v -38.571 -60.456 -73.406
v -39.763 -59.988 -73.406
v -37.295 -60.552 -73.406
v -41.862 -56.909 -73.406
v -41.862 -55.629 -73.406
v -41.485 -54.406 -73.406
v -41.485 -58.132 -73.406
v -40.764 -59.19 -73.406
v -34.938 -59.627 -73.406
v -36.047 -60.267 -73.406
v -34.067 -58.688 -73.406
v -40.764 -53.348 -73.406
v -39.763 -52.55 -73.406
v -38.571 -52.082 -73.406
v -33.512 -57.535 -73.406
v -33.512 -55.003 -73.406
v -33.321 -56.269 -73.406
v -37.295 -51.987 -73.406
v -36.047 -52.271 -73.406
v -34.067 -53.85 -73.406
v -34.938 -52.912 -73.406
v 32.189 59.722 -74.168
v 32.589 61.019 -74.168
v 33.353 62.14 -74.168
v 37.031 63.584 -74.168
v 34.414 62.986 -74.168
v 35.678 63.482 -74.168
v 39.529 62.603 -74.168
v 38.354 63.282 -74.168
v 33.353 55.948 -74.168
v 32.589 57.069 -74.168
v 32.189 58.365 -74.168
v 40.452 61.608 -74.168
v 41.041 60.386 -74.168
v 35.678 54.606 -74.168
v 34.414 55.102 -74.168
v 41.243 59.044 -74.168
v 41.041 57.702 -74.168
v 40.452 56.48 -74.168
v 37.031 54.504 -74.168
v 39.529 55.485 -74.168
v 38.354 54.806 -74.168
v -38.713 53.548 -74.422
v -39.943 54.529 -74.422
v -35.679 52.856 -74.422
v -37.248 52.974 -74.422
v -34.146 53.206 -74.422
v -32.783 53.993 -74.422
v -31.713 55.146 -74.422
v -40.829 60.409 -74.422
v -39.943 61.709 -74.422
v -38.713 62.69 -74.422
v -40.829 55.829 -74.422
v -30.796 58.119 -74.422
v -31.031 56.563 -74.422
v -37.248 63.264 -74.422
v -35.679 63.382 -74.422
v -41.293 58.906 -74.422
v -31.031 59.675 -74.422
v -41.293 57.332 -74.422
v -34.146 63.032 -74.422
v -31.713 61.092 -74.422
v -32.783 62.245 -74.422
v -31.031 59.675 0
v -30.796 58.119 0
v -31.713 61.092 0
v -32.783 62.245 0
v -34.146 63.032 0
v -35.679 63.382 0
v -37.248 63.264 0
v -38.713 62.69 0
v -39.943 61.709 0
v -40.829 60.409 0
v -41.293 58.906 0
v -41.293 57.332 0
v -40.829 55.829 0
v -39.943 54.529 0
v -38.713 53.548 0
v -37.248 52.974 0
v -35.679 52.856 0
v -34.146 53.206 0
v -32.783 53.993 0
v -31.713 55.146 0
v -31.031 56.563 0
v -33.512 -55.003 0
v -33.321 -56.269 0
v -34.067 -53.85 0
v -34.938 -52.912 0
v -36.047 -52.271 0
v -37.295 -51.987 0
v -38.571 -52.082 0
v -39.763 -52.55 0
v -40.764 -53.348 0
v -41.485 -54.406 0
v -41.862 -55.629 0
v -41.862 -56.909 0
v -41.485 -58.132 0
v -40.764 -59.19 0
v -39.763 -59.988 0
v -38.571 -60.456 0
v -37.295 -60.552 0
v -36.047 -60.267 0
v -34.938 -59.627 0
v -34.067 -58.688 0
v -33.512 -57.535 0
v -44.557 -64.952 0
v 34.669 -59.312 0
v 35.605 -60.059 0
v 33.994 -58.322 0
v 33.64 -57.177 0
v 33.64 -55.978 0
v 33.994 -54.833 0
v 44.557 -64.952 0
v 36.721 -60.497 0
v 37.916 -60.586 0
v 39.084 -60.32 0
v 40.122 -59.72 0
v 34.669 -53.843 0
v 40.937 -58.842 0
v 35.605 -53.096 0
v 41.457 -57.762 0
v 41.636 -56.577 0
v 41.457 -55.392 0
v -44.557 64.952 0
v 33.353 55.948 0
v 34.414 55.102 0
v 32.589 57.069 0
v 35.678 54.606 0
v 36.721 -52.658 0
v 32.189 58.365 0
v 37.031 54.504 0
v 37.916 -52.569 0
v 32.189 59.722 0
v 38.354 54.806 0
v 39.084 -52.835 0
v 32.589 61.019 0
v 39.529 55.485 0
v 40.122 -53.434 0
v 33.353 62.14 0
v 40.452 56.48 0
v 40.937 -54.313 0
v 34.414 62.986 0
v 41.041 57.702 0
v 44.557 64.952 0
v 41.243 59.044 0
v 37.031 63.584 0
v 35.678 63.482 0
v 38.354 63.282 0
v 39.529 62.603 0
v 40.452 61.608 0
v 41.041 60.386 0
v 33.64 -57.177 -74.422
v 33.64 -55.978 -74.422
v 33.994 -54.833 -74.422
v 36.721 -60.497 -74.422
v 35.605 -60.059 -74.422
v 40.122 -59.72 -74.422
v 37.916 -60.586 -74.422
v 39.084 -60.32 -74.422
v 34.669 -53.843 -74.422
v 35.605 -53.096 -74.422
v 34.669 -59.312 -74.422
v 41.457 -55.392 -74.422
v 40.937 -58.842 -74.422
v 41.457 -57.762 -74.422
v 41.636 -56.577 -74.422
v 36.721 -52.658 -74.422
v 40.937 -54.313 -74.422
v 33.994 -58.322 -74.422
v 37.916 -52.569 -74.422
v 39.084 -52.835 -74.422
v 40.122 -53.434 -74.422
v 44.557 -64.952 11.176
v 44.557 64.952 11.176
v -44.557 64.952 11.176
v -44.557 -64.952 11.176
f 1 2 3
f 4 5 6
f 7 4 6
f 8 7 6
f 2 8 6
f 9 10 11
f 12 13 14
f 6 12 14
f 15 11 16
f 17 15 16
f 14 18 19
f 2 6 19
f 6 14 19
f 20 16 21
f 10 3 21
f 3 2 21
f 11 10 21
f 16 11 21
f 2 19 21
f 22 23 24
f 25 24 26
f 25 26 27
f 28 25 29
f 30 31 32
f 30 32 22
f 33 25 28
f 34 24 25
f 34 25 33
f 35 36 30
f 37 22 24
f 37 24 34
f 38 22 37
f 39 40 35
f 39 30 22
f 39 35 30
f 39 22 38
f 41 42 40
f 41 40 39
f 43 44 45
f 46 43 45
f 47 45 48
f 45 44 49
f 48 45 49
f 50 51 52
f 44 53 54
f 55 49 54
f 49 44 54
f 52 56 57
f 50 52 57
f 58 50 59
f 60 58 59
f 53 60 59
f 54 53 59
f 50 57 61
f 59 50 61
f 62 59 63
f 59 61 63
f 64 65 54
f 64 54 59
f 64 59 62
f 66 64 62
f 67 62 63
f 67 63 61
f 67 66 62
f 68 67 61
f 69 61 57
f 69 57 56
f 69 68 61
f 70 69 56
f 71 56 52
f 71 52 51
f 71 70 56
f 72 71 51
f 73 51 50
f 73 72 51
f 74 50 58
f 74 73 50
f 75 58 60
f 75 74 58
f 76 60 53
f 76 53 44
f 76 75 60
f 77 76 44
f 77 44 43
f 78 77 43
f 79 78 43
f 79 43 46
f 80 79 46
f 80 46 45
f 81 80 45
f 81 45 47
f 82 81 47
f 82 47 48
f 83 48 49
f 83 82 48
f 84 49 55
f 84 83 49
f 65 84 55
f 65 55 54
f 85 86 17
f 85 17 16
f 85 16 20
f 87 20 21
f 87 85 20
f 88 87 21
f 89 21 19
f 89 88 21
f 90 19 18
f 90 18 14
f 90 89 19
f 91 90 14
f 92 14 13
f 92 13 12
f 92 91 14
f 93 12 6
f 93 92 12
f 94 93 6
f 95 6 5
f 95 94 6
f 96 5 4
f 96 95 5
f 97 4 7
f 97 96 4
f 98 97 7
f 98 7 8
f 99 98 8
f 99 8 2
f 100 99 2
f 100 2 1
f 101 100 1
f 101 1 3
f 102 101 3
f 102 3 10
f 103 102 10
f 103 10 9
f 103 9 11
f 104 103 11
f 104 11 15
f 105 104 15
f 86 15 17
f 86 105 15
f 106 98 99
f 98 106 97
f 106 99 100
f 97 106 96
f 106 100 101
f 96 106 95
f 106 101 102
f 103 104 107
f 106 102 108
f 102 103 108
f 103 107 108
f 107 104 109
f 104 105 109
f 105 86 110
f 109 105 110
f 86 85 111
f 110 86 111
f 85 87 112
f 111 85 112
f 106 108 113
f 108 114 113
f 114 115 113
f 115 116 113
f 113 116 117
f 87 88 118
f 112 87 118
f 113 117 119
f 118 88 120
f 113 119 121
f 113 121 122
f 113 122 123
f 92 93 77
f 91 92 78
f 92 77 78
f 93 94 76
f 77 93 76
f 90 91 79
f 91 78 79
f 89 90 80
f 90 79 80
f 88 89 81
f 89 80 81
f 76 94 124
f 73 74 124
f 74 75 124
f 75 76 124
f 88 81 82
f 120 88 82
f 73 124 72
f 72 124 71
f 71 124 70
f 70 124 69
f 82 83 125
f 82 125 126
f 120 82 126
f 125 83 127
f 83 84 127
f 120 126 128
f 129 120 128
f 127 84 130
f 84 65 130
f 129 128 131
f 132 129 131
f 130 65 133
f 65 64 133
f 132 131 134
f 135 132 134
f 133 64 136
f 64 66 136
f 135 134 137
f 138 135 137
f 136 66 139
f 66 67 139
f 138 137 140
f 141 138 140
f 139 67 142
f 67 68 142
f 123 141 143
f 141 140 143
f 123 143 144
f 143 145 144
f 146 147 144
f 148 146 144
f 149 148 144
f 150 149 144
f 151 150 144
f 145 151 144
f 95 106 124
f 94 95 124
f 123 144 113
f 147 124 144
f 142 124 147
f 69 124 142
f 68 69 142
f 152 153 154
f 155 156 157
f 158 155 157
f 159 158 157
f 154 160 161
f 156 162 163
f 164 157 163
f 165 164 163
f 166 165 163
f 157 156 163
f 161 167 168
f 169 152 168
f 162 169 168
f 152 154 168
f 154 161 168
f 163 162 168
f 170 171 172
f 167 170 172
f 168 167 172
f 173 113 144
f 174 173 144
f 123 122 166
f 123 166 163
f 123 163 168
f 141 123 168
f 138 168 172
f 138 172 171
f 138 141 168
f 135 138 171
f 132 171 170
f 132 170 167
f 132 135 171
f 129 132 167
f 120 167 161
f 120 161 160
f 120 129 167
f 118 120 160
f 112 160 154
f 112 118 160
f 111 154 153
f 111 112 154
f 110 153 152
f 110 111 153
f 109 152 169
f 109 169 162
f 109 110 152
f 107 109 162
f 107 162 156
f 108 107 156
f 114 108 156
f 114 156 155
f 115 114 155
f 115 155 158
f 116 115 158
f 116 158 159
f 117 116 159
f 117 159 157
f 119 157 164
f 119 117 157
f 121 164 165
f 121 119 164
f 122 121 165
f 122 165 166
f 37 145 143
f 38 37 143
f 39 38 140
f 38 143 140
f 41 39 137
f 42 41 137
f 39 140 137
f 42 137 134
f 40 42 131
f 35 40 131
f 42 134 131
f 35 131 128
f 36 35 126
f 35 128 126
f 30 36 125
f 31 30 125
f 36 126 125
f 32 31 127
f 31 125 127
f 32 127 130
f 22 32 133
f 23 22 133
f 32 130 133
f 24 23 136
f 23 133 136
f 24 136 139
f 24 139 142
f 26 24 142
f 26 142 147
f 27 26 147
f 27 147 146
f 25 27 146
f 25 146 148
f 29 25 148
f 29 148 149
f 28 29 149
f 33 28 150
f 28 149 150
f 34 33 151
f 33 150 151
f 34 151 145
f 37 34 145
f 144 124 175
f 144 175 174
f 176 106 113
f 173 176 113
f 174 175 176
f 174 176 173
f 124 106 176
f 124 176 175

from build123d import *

# Parameters (mm, degrees)
F0_W     = 89.114376
F0_H     = 129.904926
F1_DEPTH = 11.176
F2_R     = 5.277651
F6_DEPTH = 74.422
F3_R     = 4.552344
F7_DEPTH = 74.168
F4_R     = 4.294458
F8_DEPTH = 73.406
F5_R     = 4.020045
F9_DEPTH = 74.422


with BuildPart() as f1:
    # F0 (on Top) → F1 (new body)
    with BuildSketch(Plane.XY):
        Rectangle(F0_W, F0_H)
    extrude(amount=F1_DEPTH)

    # F2 (on Top) → F6 (join)
    with BuildSketch(Plane.XY):
        with Locations((-36.073875, 58.119018)):
            Circle(F2_R)
    extrude(amount=-F6_DEPTH)

    # F3 (on face) → F7 (join)
    with BuildSketch(Plane(origin=(0, 0, 0), x_dir=(1, 0, 0), z_dir=(0, 0, -1))):
        with Locations((36.690522, -59.043989)):
            Circle(F3_R)
    extrude(amount=F7_DEPTH)

    # F4 (on Top) → F8 (join)
    with BuildSketch(Plane.XY):
        with Locations((-37.615493, -56.269072)):
            Circle(F4_R)
    extrude(amount=-F8_DEPTH)

    # F5 (on Top) → F9 (join)
    with BuildSketch(Plane.XY):
        with Locations((37.615493, -56.577403)):
            Circle(F5_R)
    extrude(amount=-F9_DEPTH)


solid = f1.part
